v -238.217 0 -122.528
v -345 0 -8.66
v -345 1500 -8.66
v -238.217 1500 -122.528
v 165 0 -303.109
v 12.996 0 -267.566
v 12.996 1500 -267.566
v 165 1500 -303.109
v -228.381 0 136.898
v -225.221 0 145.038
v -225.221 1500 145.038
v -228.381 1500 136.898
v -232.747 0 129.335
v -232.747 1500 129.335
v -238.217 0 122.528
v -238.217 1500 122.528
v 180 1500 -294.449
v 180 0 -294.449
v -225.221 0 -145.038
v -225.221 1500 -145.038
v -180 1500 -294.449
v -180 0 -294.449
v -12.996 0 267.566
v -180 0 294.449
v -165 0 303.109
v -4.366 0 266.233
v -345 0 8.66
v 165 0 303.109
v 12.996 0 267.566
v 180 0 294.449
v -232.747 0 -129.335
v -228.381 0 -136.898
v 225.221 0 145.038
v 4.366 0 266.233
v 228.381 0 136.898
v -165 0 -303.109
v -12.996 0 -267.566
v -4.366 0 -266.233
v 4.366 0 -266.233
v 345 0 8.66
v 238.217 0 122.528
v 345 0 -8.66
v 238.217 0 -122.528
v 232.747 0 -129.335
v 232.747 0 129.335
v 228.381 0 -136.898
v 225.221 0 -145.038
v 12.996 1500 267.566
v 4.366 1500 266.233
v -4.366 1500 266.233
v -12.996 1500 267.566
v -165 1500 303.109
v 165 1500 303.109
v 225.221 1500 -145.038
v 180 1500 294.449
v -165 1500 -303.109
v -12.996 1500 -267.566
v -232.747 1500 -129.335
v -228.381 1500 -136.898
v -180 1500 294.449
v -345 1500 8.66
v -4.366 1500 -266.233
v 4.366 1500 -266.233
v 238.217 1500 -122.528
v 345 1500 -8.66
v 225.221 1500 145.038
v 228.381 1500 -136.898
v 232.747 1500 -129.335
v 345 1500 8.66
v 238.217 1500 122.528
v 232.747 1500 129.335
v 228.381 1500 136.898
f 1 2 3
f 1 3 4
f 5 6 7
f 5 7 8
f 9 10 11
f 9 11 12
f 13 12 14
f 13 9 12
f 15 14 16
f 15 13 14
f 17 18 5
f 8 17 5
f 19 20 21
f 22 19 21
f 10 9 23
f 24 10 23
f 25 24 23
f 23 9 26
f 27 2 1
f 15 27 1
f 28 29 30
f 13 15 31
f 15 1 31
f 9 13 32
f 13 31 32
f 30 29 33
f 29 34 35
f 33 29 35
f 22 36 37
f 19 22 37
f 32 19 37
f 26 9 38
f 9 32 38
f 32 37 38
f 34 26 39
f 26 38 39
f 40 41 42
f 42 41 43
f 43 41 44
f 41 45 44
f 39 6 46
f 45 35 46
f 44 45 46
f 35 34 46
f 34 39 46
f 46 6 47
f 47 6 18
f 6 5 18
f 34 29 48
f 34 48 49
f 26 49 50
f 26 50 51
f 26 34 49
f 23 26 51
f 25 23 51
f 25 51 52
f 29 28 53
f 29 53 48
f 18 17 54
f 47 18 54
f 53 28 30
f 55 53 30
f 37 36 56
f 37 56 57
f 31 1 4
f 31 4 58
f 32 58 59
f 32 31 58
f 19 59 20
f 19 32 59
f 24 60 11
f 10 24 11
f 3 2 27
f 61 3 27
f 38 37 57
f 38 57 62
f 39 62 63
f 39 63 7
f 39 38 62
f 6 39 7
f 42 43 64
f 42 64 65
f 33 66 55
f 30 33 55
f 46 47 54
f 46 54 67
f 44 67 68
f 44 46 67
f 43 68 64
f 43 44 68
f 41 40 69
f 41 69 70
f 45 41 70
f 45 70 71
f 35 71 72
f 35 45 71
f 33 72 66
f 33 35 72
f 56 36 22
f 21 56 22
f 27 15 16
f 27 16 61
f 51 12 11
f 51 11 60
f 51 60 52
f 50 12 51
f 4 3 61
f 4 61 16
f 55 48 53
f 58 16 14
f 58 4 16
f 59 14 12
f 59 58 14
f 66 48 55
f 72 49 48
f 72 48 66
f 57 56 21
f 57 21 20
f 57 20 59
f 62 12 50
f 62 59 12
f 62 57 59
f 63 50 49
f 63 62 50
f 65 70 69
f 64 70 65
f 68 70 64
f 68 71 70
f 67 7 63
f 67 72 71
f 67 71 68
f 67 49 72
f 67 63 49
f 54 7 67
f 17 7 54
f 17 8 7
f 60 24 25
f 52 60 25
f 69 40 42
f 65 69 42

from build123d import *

# Parameters (mm, degrees)
EXTRUDE_1_DEPTH     = 1500
CUT_EXTRUDE_4_DEPTH = 1500


with BuildPart() as part:
    # 草图2 → 凸台-拉伸1 (new body)
    with BuildSketch(Plane(origin=(0, 0, 0), x_dir=(1, 0, 0), z_dir=(0, 1, 0))):
        Polygon((345, 8.660254038), (180, 294.448637287), (165, 303.108891325), (-165, 303.108891325), (-180, 294.448637287), (-345, 8.660254038), (-345, -8.660254038), (-180, -294.448637287), (-165, -303.108891325), (165, -303.108891325), (180, -294.448637287), (345, -8.660254038), align=None)
    extrude(amount=EXTRUDE_1_DEPTH)

    # 草图5 → 切除-拉伸4 (cut)
    with BuildSketch(Plane(origin=(0, 0, 0), x_dir=(1, 0, 0), z_dir=(0, 1, 0))):
        with BuildLine():
            Line((238.21737139, 122.528375301), (345, 8.660254038))
            Line((345, 8.660254038), (379.520233023, 28.590519866))
            Line((379.520233023, 28.590519866), (334.34391274, 178.027059826))
            ThreePointArc((334.34391274, 178.027059826), (329.146090081, 190.032583711), (321.34791274, 200.536792121))
            Line((321.34791274, 200.536792121), (214.969297582, 314.638170659))
            Line((214.969297582, 314.638170659), (180, 294.448637287))
            Line((180, 294.448637287), (225.22137139, 145.038107596))
            ThreePointArc((225.22137139, 145.038107596), (230.419194049, 133.032583711), (238.21737139, 122.528375301))
        make_face()
        with BuildLine():
            Line((225.22137139, -145.038107596), (180, -294.448637287))
            Line((180, -294.448637287), (214.520233023, -314.378903115))
            Line((214.520233023, -314.378903115), (321.34791274, -200.536792121))
            ThreePointArc((321.34791274, -200.536792121), (329.146090081, -190.032583711), (334.34391274, -178.027059826))
            Line((334.34391274, -178.027059826), (379.969297582, -28.84978741))
            Line((379.969297582, -28.84978741), (345, -8.660254038))
            Line((345, -8.660254038), (238.21737139, -122.528375301))
            ThreePointArc((238.21737139, -122.528375301), (230.419194049, -133.032583711), (225.22137139, -145.038107596))
        make_face()
        with BuildLine():
            Line((12.996, 267.566482896), (165, 303.108891325))
            Line((165, 303.108891325), (165, 342.969422981))
            Line((165, 342.969422981), (12.996, 378.563851946))
            ThreePointArc((12.996, 378.563851946), (0, 380.065167421), (-12.996, 378.563851946))
            Line((-12.996, 378.563851946), (-165, 343.487958069))
            Line((-165, 343.487958069), (-165, 303.108891325))
            Line((-165, 303.108891325), (-12.996, 267.566482896))
            ThreePointArc((-12.996, 267.566482896), (0, 266.065167421), (12.996, 267.566482896))
        make_face()
        with BuildLine():
            Line((-12.996, -267.566482896), (-165, -303.108891325))
            Line((-165, -303.108891325), (-165, -342.969422981))
            Line((-165, -342.969422981), (-12.996, -378.563851946))
            ThreePointArc((-12.996, -378.563851946), (0, -380.065167421), (12.996, -378.563851946))
            Line((12.996, -378.563851946), (165, -343.487958069))
            Line((165, -343.487958069), (165, -303.108891325))
            Line((165, -303.108891325), (12.996, -267.566482896))
            ThreePointArc((12.996, -267.566482896), (0, -266.065167421), (-12.996, -267.566482896))
        make_face()
        with BuildLine():
            Line((-238.21737139, -122.528375301), (-345, -8.660254038))
            Line((-345, -8.660254038), (-379.520233023, -28.590519866))
            Line((-379.520233023, -28.590519866), (-334.34391274, -178.027059826))
            ThreePointArc((-334.34391274, -178.027059826), (-329.146090081, -190.032583711), (-321.34791274, -200.536792121))
            Line((-321.34791274, -200.536792121), (-214.969297582, -314.638170659))
            Line((-214.969297582, -314.638170659), (-180, -294.448637287))
            Line((-180, -294.448637287), (-225.22137139, -145.038107596))
            ThreePointArc((-225.22137139, -145.038107596), (-230.419194049, -133.032583711), (-238.21737139, -122.528375301))
        make_face()
        with BuildLine():
            Line((-225.22137139, 145.038107596), (-180, 294.448637287))
            Line((-180, 294.448637287), (-214.520233023, 314.378903115))
            Line((-214.520233023, 314.378903115), (-321.34791274, 200.536792121))
            ThreePointArc((-321.34791274, 200.536792121), (-329.14609008, 190.032583711), (-334.34391274, 178.027059826))
            Line((-334.34391274, 178.027059826), (-379.969297582, 28.84978741))
            Line((-379.969297582, 28.84978741), (-345, 8.660254038))
            Line((-345, 8.660254038), (-238.21737139, 122.528375301))
            ThreePointArc((-238.21737139, 122.528375301), (-230.419194049, 133.032583711), (-225.22137139, 145.038107596))
        make_face()
    extrude(amount=CUT_EXTRUDE_4_DEPTH, mode=Mode.SUBTRACT)


solid = part.part
